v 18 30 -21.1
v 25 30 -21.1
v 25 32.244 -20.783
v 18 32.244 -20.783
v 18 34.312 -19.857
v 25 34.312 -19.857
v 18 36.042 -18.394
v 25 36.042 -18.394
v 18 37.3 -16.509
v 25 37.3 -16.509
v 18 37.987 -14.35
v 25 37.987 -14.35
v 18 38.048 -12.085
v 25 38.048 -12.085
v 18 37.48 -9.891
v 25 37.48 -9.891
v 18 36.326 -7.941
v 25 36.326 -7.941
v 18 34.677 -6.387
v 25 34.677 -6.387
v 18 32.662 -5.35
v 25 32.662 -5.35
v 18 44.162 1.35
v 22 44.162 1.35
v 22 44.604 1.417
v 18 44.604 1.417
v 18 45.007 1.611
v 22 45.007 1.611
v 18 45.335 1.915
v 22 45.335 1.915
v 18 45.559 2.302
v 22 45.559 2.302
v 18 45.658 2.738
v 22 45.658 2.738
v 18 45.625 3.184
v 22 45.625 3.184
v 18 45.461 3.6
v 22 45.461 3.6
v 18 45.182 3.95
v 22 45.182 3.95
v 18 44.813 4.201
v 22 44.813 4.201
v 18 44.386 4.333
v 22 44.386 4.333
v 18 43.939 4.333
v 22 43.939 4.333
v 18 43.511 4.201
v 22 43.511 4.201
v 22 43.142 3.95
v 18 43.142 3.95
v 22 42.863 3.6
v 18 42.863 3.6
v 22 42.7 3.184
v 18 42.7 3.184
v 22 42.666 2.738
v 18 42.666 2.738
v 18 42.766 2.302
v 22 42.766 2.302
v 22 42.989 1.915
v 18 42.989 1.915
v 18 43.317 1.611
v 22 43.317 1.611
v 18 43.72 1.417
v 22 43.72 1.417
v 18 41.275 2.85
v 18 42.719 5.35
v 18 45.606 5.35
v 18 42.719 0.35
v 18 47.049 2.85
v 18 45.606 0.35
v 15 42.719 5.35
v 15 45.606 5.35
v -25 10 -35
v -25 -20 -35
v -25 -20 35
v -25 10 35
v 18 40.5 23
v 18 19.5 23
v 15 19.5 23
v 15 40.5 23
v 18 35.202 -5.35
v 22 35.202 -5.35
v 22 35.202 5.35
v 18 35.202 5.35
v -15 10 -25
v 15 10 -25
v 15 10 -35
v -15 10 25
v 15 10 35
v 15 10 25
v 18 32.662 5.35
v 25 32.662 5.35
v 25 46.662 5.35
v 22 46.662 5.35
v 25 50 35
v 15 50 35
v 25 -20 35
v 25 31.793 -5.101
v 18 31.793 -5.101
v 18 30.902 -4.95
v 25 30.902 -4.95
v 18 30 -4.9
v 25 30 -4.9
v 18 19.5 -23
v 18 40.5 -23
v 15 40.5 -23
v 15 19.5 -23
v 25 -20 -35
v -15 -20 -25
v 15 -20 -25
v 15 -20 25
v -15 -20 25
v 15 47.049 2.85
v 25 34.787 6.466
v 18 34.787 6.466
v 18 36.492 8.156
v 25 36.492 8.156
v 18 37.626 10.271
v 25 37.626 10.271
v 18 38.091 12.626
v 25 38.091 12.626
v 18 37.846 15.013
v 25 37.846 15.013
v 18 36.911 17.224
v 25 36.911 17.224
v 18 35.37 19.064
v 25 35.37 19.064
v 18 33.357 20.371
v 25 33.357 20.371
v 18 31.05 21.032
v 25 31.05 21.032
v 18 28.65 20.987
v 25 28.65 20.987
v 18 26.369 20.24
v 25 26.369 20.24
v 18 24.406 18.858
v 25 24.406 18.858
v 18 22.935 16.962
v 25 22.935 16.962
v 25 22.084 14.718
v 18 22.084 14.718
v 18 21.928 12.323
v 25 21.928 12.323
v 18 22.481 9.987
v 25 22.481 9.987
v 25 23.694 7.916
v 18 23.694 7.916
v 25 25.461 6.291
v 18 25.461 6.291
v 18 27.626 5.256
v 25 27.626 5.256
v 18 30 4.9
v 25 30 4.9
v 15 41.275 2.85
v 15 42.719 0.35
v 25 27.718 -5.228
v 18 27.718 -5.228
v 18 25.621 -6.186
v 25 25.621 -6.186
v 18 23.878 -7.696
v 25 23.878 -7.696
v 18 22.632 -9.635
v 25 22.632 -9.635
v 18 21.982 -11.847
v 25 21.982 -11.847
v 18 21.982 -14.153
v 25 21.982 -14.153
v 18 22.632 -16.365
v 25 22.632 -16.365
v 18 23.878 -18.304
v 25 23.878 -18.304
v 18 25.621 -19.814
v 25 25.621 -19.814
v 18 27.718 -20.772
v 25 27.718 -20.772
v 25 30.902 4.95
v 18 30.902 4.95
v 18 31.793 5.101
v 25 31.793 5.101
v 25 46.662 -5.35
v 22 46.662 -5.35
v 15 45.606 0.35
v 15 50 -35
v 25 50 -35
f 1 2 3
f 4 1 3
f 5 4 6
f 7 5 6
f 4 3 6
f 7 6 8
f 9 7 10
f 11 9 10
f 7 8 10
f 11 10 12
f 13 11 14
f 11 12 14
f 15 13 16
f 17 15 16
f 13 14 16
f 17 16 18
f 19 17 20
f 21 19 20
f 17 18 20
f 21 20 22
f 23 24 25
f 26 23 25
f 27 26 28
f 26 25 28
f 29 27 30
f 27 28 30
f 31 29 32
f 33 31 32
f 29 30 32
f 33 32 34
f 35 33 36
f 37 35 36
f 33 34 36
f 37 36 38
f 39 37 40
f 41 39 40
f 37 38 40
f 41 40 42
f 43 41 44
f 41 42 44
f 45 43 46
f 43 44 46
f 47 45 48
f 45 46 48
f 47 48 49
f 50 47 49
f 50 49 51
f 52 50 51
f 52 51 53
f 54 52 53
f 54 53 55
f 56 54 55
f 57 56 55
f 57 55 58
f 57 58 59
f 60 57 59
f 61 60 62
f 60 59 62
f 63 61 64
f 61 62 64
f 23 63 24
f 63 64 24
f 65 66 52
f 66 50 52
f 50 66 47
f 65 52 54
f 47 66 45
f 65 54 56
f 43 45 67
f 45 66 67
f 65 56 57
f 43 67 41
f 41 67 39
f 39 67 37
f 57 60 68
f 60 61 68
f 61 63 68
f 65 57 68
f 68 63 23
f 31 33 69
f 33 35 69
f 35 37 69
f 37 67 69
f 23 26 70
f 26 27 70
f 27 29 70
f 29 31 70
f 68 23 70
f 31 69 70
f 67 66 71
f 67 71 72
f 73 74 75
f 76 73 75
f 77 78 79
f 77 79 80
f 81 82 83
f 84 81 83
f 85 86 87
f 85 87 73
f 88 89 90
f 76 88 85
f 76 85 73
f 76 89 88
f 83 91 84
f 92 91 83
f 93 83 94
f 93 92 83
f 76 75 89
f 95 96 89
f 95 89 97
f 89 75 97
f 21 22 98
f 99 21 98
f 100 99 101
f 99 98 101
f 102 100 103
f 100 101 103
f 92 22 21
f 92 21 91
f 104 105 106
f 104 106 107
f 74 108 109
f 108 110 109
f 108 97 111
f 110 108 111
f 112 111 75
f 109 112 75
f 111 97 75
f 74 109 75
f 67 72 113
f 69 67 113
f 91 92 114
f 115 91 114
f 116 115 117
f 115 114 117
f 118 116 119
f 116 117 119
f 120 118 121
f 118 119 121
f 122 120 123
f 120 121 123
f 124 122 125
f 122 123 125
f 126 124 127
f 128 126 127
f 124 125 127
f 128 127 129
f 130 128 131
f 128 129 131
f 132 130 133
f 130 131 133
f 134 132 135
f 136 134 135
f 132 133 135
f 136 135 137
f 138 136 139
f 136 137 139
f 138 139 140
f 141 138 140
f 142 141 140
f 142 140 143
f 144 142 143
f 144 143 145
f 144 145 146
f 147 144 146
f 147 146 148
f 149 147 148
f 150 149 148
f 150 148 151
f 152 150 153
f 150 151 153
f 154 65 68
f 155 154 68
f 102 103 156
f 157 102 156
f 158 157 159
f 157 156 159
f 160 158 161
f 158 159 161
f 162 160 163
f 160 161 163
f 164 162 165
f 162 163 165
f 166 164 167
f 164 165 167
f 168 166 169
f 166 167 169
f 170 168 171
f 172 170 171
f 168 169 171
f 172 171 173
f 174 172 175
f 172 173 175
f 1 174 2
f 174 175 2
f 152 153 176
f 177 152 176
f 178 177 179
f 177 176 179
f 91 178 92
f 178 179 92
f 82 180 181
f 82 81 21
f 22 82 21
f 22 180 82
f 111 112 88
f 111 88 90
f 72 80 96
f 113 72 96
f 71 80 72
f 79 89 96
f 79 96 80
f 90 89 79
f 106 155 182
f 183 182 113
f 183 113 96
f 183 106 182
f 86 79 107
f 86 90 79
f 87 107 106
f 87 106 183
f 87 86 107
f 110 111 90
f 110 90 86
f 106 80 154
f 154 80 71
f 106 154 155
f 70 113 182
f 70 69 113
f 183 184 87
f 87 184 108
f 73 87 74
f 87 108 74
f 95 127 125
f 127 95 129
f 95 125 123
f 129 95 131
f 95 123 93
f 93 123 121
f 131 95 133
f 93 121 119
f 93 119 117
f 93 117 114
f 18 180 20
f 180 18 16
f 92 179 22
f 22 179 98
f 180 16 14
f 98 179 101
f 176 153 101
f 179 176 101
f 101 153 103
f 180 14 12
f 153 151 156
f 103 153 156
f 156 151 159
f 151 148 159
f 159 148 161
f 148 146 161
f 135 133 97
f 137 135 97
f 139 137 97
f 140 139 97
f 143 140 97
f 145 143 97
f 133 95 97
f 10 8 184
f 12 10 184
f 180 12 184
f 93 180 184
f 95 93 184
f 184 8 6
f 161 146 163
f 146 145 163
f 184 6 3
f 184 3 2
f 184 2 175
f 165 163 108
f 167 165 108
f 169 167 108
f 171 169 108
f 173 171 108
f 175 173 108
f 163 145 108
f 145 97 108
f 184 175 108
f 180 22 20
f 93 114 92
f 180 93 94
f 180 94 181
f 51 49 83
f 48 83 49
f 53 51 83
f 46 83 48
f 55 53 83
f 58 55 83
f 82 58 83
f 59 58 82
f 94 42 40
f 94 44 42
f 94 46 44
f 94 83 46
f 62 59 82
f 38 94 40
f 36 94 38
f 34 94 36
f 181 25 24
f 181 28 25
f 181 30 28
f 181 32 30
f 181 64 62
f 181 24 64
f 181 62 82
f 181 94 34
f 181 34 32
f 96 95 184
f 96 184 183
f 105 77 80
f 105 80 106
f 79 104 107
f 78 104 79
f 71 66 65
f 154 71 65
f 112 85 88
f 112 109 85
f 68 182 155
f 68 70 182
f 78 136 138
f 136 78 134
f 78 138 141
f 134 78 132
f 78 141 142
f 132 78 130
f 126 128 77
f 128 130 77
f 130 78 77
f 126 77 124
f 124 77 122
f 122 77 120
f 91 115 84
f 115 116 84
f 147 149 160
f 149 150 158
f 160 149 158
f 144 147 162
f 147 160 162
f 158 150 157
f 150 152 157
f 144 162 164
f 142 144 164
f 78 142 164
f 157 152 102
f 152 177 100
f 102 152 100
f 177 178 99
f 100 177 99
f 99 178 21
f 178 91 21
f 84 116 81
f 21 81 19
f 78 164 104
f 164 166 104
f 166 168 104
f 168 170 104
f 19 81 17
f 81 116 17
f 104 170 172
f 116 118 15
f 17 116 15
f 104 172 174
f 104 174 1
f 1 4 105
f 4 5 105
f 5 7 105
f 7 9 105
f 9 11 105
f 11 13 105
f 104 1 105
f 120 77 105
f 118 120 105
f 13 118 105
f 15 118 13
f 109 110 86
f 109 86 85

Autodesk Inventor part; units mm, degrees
ref_plane "YZ Plane" through (0, 0, 0) normal (1, 0, 0) x (0, 1, 0)
ref_plane "XZ Plane" through (0, 0, 0) normal (0, 1, 0) x (-1, 0, 0)
ref_plane "XY Plane" through (0, 0, 0) normal (0, 0, 1) x (1, 0, 0)
sketch "Szkic7" plane through (0, 0, 0) normal (0, 1, 0) x (-1, 0, 0)
  line L0 (0, -49) -> (0, 49) projected
  line L1 (35, 0) -> (-35, 0) projected
  line L2 (15, 25) -> (-15, 25)
  line L3 (-15, 25) -> (-15, -25)
  line L4 (-15, -25) -> (15, -25)
  line L5 (15, -25) -> (15, 25)
  line L6 (15, 25) -> (-15, -25) construction
  line L7 (-15, 25) -> (15, -25) construction
  line L8 (25, 35) -> (-25, 35)
  line L9 (-25, 35) -> (-25, -35)
  line L10 (-25, -35) -> (25, -35)
  line L11 (25, -35) -> (25, 35)
  line L12 (25, 35) -> (-25, -35) construction
  line L13 (-25, 35) -> (25, -35) construction
  line L14 (-15, 25) -> (-15, 35)
  line L15 (-15, -25) -> (-15, -35)
  point P0 (0, 0)
  dimension "d40" = 30
  dimension "d41" = 50
  dimension "d42" = 50
  dimension "d43" = 70
extrude "Wyciągnięcie proste6" add sketch "Szkic7" along normal blind 10 contours L10 L15 L4 L0 | L0 L4 L5 L1 L11 L10 | L10 L9 L1 L3 L15 | L1 L5 L2 L0 L8 L11 | L2 L14 L8 L0 | L1 L9 L8 L14 L3
extrude "Wyciągnięcie proste7" add sketch "Szkic7" along normal blind 50 contours L10 L9 L1 L3 L15 | L1 L9 L8 L14 L3
sketch "Szkic8" plane through (25, 0, 35) normal (1, 0, 0) x (0, 0, -1)
  line L0 (0, 10) -> (70, 10)
  line L1 (70, 10) -> (70, 50)
  line L2 (70, 50) -> (0, 50)
  line L3 (0, 50) -> (0, 10)
  line L4 (35, 50) -> (35, 10)
  circle A0 centre (48, 30) radius 8.1
  line L5 (48, 30) -> (35, 30)
  circle A1 centre (22, 30) radius 8.1
  line L6 (29.65, 46.662236) -> (40.35, 46.662236)
  line L7 (40.35, 46.662236) -> (40.35, 32.662236)
  line L8 (40.35, 32.662236) -> (29.65, 32.662236)
  line L9 (29.65, 32.662236) -> (29.65, 46.662236)
  line L10 (29.65, 46.662236) -> (40.35, 32.662236) construction
  line L11 (40.35, 46.662236) -> (29.65, 32.662236) construction
  circle A2 centre (32.15, 44.162236) radius 1.5
  line L12 (29.65, 44.162236) -> (30.65, 44.162236) construction
  line L13 (32.15, 46.662236) -> (32.15, 45.662236) construction
  line L14 (35, 32.662236) -> (35, 35.202236)
  line L15 (35, 35.202236) -> (40.35, 35.202236)
  line L16 (35, 35.202236) -> (29.65, 35.202236)
  circle A3 centre (32.15, 44.162236) radius 2.5 construction
  line L17 (29.65, 42.71886) -> (32.15, 41.275485)
  line L18 (32.15, 41.275485) -> (34.65, 42.71886)
  line L19 (29.65, 42.71886) -> (29.65, 45.605612)
  line L20 (29.65, 45.605612) -> (32.15, 47.048987)
  line L21 (32.15, 47.048987) -> (34.65, 45.605612)
  line L22 (34.65, 45.605612) -> (34.65, 42.71886)
  line L23 (12, 40.5) -> (58, 40.5)
  line L24 (58, 40.5) -> (58, 19.5)
  line L25 (58, 19.5) -> (12, 19.5)
  line L26 (12, 19.5) -> (12, 40.5)
  line L27 (12, 40.5) -> (58, 19.5) construction
  line L28 (58, 40.5) -> (12, 19.5) construction
  point P0 (35, 39.662236)
  point P1 (9.59459, 19.012494)
  point P2 (9.59459, 19.012494)
  point P3 (12.764463, 33.012494)
  point P4 (11.424717, 33.012494)
  point P5 (9.59459, 29.069118)
  point P6 (32.819873, 46.662236)
  point P7 (31.480127, 46.662236)
  dimension "d62" = 16.2
  dimension "d63" = 13
  dimension "d64" = 10.7
  dimension "d65" = 14
  dimension "d66" = 3
  dimension "d67" = 1
  dimension "d68" = 1
  dimension "d69" = 2.54
  dimension "d70" = 5
  dimension "d71" = 120
  dimension "d72" = 120
  dimension "d73" = 120
  dimension "d74" = 120
  dimension "d75" = 120
  dimension "d76" = 40
  dimension "d77" = 46
  dimension "d78" = 21
extrude "Wyciągnięcie proste8" cut sketch "Szkic8" against normal through all contours A1 | L25 L26 L23 L9 L8 L4 | L4 L5 A0 L7 L23 L24 L25 | L4 L8 A0 L5 | L8 L9 L16 L4 | L4 L15 L7 L8 | A0 | L23 L7 L15 L4 | L4 L16 L9 L23 | L21 L22 L18 L17 L9 L20 L6 | L6 L20 L21 | A2
extrude "Wyciągnięcie proste9" add sketch "Szkic8" against normal blind 7 contours L25 L26 L23 L9 L8 L4 | L4 L5 A0 L7 L23 L24 L25 | L4 L8 A0 L5 | L23 L7 L15 L4 | L4 L16 L9 L23 | L21 L22 L18 L17 L9 L20 L6 | L6 L20 L21
extrude "Wyciągnięcie proste10" cut sketch "Szkic8" against normal blind 3 contours L6 L7 L23 L4 | L4 L23 L9 L17 L18 L22 L21 L6 | L23 L7 L15 L4 | L4 L16 L9 L23 | L21 L22 L18 L17 L9 L20 L6 | L20 L9 L6
extrude "Wyciągnięcie proste11" add sketch "Szkic7" against normal blind 20 contours L10 L15 L4 L0 | L0 L4 L5 L1 L11 L10 | L10 L9 L1 L3 L15 | L1 L5 L2 L0 L8 L11 | L2 L14 L8 L0 | L1 L9 L8 L14 L3
properties part number "uMule-UDaR-sensor"
